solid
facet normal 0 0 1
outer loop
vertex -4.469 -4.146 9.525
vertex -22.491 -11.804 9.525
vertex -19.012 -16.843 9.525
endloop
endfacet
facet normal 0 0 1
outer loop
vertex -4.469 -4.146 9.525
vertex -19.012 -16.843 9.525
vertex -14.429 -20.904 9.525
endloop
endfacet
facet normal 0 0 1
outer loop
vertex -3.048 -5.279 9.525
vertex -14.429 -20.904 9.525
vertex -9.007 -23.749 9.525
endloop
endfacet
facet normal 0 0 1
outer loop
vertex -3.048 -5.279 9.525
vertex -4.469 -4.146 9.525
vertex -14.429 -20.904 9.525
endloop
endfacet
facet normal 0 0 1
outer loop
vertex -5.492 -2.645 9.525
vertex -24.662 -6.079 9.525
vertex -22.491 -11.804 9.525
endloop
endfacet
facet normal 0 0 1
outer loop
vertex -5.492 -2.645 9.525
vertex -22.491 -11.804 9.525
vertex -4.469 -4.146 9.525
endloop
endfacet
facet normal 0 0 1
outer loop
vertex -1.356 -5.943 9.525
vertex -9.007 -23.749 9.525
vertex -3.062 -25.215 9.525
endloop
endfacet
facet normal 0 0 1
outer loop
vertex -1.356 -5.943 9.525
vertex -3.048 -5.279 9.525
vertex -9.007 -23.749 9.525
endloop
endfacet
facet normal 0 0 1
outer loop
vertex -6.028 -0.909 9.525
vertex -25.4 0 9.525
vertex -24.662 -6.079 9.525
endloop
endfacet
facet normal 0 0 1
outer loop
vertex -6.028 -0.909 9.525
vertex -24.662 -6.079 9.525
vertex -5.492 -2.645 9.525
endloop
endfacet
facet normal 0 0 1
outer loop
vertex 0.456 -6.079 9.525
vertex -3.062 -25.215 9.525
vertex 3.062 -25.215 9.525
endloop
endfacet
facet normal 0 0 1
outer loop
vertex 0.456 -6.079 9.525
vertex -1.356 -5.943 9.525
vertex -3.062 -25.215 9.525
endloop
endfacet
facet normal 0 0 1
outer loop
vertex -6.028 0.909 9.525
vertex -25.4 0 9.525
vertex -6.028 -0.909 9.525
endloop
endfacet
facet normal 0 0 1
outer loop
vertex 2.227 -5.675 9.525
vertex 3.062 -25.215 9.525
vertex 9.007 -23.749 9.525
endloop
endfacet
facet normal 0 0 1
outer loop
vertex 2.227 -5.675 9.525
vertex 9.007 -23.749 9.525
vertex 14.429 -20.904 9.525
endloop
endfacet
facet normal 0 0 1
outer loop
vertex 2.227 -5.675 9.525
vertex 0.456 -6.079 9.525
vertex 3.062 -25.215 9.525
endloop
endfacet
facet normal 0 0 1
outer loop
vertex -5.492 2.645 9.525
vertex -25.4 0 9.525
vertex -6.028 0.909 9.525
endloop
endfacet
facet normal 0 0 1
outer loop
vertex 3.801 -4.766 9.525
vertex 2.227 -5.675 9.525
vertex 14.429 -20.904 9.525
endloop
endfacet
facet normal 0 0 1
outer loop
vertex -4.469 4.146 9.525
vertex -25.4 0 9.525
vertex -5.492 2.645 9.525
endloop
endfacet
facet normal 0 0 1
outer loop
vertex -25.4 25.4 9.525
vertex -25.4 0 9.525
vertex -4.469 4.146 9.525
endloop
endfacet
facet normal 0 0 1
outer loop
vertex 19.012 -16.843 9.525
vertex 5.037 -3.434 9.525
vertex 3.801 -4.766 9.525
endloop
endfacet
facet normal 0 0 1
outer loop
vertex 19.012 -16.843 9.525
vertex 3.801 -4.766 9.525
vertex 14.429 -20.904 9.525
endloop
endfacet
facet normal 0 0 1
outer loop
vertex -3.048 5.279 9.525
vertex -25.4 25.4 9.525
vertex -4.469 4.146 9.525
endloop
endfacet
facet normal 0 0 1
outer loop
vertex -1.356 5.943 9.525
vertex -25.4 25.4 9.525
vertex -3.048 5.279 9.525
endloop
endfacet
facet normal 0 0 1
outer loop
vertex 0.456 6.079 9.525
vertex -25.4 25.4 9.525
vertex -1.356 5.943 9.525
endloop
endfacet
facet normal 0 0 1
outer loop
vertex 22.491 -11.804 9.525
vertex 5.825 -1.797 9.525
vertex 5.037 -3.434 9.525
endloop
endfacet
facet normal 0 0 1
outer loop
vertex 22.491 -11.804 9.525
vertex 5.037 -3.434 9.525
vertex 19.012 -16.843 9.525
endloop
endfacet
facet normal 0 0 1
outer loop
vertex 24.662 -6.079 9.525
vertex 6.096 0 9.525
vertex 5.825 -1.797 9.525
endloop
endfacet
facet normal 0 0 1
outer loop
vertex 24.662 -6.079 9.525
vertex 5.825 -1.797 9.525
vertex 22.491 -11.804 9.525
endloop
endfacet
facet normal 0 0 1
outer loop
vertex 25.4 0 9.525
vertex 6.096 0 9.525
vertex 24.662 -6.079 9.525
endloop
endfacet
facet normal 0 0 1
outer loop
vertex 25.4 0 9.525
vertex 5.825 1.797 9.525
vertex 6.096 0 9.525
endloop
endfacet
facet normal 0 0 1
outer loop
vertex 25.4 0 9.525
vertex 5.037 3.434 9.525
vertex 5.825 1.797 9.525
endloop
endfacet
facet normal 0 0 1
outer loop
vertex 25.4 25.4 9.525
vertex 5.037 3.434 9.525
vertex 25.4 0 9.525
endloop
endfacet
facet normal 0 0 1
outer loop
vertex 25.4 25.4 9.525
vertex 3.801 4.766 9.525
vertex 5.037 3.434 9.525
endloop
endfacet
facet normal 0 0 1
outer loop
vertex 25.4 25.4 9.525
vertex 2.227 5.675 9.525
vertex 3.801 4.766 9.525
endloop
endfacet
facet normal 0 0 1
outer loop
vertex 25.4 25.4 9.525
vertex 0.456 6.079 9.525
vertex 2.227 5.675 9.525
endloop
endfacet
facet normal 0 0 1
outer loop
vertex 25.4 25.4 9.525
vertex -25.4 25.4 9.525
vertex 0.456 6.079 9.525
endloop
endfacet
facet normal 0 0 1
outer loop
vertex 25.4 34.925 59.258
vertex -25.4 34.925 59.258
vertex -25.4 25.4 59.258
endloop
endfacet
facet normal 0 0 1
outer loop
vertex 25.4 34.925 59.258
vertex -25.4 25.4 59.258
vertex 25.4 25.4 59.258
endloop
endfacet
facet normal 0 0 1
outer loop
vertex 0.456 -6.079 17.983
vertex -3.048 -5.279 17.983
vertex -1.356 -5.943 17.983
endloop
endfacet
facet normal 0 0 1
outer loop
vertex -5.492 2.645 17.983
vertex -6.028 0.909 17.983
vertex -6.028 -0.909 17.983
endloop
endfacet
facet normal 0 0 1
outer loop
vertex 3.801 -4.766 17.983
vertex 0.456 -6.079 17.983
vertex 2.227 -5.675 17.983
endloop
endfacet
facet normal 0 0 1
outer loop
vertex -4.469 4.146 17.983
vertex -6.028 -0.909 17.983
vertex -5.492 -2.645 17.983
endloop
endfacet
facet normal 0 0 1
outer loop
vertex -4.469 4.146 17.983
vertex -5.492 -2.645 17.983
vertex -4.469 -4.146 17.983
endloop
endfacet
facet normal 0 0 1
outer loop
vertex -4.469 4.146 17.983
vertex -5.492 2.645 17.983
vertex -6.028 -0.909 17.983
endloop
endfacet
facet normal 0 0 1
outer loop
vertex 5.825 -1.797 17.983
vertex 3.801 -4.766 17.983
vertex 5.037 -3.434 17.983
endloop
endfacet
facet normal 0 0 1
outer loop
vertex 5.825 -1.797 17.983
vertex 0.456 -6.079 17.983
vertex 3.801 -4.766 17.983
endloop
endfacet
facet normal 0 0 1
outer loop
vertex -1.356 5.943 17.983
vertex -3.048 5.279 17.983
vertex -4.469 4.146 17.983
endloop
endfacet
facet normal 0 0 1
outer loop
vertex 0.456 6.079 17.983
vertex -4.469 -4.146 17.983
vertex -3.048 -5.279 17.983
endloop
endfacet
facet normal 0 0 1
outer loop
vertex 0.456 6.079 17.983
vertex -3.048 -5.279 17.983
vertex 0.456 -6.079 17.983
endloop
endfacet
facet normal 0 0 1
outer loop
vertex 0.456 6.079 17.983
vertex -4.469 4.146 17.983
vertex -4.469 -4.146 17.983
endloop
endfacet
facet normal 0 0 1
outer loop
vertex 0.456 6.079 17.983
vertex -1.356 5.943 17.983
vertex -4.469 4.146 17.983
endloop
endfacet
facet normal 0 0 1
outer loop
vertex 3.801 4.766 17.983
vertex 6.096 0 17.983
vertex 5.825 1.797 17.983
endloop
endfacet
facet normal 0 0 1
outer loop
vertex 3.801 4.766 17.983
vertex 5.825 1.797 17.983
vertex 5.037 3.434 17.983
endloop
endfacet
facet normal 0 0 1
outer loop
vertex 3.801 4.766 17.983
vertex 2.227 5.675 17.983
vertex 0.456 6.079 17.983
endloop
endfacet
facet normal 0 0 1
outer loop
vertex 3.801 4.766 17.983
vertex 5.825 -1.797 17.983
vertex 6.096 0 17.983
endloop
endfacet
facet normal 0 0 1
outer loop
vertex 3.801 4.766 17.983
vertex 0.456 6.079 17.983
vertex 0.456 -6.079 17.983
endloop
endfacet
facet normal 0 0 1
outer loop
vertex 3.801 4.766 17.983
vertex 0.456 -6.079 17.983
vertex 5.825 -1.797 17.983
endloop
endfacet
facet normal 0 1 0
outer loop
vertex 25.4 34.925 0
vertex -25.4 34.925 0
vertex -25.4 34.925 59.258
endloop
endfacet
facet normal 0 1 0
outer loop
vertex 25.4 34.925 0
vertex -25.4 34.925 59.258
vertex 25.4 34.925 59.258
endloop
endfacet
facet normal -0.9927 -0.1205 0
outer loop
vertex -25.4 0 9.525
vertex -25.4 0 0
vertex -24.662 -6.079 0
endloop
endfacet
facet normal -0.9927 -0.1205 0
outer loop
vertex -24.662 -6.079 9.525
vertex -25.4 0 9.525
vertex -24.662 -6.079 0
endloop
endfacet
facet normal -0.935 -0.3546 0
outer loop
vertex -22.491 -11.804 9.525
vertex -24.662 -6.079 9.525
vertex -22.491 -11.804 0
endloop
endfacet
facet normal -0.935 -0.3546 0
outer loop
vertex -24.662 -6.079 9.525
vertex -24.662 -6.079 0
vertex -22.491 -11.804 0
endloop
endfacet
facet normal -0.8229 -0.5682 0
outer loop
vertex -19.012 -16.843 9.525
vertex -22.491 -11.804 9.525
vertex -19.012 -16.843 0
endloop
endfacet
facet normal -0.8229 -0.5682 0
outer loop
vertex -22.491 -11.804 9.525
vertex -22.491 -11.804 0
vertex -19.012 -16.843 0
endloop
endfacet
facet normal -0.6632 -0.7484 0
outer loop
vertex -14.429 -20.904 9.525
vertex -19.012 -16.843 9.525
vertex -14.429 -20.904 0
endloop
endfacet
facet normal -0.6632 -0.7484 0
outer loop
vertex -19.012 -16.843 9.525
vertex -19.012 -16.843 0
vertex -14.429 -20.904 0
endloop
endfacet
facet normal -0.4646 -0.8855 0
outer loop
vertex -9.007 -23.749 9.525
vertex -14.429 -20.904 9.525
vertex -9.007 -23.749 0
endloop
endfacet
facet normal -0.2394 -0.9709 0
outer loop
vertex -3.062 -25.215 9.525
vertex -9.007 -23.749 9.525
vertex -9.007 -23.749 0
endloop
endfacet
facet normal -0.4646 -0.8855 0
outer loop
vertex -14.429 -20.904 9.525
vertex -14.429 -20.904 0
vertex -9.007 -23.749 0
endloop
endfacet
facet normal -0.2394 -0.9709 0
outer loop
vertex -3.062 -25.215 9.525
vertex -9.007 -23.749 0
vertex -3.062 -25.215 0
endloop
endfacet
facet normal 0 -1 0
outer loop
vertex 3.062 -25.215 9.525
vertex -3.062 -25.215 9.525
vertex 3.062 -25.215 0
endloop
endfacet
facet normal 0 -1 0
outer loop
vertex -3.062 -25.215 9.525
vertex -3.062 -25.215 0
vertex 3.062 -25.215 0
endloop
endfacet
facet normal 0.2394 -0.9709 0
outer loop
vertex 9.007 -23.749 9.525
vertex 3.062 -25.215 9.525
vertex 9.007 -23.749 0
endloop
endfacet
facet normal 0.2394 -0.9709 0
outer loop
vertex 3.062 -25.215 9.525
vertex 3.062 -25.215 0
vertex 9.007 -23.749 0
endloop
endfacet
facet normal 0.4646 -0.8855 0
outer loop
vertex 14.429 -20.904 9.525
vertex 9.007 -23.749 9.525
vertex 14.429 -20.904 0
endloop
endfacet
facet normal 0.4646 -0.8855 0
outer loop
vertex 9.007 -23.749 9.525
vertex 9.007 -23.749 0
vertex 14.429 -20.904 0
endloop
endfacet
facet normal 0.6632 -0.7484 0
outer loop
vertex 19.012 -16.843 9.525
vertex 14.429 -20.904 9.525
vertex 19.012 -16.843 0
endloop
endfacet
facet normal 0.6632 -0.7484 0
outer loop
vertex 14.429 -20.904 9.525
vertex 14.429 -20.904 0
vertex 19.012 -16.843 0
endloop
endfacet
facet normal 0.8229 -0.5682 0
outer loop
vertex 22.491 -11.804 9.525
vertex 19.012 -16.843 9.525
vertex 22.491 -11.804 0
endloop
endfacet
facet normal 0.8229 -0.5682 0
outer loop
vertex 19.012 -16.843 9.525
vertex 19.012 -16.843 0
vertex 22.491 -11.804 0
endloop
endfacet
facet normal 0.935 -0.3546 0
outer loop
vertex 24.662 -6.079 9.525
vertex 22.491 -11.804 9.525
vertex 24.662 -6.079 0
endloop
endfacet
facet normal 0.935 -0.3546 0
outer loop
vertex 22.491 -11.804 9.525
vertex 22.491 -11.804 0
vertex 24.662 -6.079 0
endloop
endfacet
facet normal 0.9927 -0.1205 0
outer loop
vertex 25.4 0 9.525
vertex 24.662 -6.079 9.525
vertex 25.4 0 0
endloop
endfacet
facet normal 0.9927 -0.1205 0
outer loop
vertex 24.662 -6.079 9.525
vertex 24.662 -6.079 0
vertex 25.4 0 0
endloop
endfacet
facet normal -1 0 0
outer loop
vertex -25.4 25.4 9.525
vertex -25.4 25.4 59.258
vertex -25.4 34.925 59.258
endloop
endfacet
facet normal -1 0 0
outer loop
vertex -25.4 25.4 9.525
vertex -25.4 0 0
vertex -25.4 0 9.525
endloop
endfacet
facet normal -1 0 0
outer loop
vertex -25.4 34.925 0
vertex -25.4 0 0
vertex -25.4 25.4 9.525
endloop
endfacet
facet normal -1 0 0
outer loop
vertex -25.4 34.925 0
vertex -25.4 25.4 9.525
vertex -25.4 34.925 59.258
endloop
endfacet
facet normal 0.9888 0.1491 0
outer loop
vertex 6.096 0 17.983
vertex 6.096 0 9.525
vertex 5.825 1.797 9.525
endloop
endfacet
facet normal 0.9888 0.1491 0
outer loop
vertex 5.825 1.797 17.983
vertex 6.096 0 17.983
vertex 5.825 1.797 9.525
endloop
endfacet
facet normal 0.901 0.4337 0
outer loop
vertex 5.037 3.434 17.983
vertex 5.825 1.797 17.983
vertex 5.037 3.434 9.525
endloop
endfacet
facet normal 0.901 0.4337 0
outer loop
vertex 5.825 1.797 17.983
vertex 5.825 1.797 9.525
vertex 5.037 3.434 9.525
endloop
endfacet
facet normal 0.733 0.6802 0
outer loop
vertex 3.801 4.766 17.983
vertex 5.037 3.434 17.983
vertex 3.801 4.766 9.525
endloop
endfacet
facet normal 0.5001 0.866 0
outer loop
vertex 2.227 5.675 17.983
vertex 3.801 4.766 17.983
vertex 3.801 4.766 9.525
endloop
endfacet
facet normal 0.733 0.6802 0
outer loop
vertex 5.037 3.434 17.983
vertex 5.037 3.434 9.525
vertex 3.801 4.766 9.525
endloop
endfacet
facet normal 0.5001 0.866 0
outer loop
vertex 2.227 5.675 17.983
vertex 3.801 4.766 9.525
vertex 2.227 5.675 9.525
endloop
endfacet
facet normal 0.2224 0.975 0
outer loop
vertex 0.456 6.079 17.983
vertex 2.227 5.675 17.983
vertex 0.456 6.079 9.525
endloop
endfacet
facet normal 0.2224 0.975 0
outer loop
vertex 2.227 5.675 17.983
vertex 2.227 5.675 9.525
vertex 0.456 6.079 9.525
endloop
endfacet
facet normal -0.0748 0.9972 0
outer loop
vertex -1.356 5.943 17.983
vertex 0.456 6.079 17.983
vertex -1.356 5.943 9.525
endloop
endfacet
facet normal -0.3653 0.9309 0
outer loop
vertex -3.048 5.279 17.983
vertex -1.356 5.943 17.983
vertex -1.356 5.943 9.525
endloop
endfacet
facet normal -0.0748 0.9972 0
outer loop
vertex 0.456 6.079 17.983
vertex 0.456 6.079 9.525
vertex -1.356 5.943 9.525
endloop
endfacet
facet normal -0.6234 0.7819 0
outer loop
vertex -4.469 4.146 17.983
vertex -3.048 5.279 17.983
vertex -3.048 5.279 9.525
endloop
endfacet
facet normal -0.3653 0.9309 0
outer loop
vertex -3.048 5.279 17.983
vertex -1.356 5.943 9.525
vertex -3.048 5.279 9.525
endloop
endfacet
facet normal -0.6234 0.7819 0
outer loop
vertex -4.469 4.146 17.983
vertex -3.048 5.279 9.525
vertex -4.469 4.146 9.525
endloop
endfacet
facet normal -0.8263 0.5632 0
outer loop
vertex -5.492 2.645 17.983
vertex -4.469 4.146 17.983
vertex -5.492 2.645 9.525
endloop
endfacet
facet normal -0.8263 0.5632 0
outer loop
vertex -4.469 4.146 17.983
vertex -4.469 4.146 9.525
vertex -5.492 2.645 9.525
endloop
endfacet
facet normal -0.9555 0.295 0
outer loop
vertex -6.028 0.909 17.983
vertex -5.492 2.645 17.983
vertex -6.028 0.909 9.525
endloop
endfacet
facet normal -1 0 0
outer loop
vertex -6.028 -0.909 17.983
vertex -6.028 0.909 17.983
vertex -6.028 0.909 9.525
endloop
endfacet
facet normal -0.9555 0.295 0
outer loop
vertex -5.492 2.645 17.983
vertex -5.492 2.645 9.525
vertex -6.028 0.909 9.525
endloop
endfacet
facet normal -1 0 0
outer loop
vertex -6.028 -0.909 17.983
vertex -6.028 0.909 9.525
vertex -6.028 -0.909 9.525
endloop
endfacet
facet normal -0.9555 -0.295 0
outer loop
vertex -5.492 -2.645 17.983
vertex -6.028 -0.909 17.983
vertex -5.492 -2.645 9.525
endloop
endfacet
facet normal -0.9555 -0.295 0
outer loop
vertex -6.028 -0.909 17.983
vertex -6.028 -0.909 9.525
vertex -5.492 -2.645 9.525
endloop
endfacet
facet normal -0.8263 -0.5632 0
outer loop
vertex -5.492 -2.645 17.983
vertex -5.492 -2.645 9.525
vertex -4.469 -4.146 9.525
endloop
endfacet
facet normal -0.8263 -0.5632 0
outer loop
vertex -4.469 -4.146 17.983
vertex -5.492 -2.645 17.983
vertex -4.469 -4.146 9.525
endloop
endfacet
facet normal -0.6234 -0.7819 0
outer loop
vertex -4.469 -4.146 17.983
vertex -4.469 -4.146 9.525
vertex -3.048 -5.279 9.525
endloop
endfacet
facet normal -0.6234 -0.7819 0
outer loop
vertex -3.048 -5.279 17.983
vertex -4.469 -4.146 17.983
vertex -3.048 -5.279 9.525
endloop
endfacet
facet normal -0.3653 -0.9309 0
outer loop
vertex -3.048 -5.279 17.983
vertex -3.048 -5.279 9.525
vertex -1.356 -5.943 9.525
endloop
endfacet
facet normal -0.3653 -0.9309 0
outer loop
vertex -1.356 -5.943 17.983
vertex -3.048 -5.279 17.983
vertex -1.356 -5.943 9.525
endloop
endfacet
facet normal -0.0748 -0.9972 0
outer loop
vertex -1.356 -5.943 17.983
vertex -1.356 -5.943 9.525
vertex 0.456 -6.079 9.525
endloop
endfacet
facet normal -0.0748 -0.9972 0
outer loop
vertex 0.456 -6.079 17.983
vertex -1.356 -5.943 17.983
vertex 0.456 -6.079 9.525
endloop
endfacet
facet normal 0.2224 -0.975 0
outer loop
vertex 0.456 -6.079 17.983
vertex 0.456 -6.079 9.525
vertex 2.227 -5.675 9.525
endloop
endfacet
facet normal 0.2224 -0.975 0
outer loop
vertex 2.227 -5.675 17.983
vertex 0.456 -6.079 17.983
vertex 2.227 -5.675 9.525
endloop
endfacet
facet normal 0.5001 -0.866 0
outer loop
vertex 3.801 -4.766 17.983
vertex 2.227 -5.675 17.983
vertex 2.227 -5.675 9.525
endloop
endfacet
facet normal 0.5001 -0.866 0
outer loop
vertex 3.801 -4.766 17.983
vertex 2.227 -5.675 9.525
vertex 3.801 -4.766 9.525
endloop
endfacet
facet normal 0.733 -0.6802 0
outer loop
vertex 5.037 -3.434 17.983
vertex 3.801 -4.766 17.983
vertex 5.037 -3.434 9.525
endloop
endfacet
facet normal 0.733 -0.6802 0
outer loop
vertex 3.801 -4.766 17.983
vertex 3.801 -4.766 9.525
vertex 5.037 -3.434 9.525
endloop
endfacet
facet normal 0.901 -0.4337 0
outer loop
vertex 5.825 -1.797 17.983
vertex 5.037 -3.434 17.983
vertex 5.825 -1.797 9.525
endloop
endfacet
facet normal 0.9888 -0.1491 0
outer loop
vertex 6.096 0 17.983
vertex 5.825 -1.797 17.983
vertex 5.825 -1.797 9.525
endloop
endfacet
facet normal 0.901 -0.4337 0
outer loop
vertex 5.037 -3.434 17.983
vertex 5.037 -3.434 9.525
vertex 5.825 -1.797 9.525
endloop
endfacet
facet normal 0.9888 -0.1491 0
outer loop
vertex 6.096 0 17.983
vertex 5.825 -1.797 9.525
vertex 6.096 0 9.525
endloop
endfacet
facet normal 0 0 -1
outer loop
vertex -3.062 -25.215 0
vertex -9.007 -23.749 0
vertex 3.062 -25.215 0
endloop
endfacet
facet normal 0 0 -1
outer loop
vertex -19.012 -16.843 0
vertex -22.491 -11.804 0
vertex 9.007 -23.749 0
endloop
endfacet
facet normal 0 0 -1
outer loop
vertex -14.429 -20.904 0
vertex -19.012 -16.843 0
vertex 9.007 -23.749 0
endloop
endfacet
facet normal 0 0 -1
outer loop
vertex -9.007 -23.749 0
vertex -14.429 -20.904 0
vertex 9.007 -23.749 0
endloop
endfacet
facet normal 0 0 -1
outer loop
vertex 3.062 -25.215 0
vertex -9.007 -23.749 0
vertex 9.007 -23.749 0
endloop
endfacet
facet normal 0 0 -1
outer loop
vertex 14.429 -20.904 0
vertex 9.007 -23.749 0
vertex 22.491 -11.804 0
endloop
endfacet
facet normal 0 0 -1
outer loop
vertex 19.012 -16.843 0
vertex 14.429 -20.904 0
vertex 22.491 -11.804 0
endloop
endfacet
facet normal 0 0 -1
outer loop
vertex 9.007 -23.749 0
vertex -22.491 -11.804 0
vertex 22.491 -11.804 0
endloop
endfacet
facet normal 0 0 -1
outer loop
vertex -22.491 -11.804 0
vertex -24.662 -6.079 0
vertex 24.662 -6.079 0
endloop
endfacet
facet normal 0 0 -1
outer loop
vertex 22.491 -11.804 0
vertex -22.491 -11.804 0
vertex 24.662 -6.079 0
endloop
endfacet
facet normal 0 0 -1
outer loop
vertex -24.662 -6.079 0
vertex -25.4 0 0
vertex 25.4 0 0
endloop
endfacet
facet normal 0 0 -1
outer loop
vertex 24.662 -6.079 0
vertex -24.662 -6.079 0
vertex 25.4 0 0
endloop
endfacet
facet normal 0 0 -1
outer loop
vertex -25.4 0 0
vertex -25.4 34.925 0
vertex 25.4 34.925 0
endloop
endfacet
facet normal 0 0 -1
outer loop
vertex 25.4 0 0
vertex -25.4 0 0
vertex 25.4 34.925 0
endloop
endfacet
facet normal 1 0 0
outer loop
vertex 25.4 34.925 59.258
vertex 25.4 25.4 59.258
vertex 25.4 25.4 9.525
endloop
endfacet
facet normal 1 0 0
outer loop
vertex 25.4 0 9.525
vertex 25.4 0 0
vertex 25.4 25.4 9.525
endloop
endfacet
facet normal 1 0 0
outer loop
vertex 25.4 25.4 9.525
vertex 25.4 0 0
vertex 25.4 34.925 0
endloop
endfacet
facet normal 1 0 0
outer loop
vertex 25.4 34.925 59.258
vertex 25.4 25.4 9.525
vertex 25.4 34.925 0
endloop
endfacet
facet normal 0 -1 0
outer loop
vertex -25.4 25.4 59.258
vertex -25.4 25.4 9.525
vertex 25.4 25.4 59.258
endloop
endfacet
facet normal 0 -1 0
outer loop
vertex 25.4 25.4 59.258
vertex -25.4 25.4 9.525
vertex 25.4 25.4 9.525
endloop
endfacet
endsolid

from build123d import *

# Parameters (mm, degrees)
F1_DEPTH = 9.525
F0_W     = 50.8
F0_H     = 9.525
F2_DEPTH = 59.2582
F3_R     = 6.096
F4_DEPTH = 8.4582


with BuildPart() as f1:
    # F0 (on Top) → F1 (new body)
    with BuildSketch(Plane.XY):
        with BuildLine():
            Line((25.4, 25.4), (-25.4, 25.4))
            Line((-25.4, 25.4), (-25.4, 0))
            ThreePointArc((-25.4, 0), (0, -25.4), (25.4, 0))
            Line((25.4, 0), (25.4, 25.4))
        make_face()
    extrude(amount=F1_DEPTH)

    # F0 (on Top) → F2 (join)
    with BuildSketch(Plane.XY):
        with Locations((0, 30.1625)):
            Rectangle(F0_W, F0_H)
    extrude(amount=F2_DEPTH)

    # F3 (on face) → F4 (join)
    with BuildSketch(Plane.XY.offset(9.525)):
        Circle(F3_R)
    extrude(amount=F4_DEPTH)


solid = f1.part
